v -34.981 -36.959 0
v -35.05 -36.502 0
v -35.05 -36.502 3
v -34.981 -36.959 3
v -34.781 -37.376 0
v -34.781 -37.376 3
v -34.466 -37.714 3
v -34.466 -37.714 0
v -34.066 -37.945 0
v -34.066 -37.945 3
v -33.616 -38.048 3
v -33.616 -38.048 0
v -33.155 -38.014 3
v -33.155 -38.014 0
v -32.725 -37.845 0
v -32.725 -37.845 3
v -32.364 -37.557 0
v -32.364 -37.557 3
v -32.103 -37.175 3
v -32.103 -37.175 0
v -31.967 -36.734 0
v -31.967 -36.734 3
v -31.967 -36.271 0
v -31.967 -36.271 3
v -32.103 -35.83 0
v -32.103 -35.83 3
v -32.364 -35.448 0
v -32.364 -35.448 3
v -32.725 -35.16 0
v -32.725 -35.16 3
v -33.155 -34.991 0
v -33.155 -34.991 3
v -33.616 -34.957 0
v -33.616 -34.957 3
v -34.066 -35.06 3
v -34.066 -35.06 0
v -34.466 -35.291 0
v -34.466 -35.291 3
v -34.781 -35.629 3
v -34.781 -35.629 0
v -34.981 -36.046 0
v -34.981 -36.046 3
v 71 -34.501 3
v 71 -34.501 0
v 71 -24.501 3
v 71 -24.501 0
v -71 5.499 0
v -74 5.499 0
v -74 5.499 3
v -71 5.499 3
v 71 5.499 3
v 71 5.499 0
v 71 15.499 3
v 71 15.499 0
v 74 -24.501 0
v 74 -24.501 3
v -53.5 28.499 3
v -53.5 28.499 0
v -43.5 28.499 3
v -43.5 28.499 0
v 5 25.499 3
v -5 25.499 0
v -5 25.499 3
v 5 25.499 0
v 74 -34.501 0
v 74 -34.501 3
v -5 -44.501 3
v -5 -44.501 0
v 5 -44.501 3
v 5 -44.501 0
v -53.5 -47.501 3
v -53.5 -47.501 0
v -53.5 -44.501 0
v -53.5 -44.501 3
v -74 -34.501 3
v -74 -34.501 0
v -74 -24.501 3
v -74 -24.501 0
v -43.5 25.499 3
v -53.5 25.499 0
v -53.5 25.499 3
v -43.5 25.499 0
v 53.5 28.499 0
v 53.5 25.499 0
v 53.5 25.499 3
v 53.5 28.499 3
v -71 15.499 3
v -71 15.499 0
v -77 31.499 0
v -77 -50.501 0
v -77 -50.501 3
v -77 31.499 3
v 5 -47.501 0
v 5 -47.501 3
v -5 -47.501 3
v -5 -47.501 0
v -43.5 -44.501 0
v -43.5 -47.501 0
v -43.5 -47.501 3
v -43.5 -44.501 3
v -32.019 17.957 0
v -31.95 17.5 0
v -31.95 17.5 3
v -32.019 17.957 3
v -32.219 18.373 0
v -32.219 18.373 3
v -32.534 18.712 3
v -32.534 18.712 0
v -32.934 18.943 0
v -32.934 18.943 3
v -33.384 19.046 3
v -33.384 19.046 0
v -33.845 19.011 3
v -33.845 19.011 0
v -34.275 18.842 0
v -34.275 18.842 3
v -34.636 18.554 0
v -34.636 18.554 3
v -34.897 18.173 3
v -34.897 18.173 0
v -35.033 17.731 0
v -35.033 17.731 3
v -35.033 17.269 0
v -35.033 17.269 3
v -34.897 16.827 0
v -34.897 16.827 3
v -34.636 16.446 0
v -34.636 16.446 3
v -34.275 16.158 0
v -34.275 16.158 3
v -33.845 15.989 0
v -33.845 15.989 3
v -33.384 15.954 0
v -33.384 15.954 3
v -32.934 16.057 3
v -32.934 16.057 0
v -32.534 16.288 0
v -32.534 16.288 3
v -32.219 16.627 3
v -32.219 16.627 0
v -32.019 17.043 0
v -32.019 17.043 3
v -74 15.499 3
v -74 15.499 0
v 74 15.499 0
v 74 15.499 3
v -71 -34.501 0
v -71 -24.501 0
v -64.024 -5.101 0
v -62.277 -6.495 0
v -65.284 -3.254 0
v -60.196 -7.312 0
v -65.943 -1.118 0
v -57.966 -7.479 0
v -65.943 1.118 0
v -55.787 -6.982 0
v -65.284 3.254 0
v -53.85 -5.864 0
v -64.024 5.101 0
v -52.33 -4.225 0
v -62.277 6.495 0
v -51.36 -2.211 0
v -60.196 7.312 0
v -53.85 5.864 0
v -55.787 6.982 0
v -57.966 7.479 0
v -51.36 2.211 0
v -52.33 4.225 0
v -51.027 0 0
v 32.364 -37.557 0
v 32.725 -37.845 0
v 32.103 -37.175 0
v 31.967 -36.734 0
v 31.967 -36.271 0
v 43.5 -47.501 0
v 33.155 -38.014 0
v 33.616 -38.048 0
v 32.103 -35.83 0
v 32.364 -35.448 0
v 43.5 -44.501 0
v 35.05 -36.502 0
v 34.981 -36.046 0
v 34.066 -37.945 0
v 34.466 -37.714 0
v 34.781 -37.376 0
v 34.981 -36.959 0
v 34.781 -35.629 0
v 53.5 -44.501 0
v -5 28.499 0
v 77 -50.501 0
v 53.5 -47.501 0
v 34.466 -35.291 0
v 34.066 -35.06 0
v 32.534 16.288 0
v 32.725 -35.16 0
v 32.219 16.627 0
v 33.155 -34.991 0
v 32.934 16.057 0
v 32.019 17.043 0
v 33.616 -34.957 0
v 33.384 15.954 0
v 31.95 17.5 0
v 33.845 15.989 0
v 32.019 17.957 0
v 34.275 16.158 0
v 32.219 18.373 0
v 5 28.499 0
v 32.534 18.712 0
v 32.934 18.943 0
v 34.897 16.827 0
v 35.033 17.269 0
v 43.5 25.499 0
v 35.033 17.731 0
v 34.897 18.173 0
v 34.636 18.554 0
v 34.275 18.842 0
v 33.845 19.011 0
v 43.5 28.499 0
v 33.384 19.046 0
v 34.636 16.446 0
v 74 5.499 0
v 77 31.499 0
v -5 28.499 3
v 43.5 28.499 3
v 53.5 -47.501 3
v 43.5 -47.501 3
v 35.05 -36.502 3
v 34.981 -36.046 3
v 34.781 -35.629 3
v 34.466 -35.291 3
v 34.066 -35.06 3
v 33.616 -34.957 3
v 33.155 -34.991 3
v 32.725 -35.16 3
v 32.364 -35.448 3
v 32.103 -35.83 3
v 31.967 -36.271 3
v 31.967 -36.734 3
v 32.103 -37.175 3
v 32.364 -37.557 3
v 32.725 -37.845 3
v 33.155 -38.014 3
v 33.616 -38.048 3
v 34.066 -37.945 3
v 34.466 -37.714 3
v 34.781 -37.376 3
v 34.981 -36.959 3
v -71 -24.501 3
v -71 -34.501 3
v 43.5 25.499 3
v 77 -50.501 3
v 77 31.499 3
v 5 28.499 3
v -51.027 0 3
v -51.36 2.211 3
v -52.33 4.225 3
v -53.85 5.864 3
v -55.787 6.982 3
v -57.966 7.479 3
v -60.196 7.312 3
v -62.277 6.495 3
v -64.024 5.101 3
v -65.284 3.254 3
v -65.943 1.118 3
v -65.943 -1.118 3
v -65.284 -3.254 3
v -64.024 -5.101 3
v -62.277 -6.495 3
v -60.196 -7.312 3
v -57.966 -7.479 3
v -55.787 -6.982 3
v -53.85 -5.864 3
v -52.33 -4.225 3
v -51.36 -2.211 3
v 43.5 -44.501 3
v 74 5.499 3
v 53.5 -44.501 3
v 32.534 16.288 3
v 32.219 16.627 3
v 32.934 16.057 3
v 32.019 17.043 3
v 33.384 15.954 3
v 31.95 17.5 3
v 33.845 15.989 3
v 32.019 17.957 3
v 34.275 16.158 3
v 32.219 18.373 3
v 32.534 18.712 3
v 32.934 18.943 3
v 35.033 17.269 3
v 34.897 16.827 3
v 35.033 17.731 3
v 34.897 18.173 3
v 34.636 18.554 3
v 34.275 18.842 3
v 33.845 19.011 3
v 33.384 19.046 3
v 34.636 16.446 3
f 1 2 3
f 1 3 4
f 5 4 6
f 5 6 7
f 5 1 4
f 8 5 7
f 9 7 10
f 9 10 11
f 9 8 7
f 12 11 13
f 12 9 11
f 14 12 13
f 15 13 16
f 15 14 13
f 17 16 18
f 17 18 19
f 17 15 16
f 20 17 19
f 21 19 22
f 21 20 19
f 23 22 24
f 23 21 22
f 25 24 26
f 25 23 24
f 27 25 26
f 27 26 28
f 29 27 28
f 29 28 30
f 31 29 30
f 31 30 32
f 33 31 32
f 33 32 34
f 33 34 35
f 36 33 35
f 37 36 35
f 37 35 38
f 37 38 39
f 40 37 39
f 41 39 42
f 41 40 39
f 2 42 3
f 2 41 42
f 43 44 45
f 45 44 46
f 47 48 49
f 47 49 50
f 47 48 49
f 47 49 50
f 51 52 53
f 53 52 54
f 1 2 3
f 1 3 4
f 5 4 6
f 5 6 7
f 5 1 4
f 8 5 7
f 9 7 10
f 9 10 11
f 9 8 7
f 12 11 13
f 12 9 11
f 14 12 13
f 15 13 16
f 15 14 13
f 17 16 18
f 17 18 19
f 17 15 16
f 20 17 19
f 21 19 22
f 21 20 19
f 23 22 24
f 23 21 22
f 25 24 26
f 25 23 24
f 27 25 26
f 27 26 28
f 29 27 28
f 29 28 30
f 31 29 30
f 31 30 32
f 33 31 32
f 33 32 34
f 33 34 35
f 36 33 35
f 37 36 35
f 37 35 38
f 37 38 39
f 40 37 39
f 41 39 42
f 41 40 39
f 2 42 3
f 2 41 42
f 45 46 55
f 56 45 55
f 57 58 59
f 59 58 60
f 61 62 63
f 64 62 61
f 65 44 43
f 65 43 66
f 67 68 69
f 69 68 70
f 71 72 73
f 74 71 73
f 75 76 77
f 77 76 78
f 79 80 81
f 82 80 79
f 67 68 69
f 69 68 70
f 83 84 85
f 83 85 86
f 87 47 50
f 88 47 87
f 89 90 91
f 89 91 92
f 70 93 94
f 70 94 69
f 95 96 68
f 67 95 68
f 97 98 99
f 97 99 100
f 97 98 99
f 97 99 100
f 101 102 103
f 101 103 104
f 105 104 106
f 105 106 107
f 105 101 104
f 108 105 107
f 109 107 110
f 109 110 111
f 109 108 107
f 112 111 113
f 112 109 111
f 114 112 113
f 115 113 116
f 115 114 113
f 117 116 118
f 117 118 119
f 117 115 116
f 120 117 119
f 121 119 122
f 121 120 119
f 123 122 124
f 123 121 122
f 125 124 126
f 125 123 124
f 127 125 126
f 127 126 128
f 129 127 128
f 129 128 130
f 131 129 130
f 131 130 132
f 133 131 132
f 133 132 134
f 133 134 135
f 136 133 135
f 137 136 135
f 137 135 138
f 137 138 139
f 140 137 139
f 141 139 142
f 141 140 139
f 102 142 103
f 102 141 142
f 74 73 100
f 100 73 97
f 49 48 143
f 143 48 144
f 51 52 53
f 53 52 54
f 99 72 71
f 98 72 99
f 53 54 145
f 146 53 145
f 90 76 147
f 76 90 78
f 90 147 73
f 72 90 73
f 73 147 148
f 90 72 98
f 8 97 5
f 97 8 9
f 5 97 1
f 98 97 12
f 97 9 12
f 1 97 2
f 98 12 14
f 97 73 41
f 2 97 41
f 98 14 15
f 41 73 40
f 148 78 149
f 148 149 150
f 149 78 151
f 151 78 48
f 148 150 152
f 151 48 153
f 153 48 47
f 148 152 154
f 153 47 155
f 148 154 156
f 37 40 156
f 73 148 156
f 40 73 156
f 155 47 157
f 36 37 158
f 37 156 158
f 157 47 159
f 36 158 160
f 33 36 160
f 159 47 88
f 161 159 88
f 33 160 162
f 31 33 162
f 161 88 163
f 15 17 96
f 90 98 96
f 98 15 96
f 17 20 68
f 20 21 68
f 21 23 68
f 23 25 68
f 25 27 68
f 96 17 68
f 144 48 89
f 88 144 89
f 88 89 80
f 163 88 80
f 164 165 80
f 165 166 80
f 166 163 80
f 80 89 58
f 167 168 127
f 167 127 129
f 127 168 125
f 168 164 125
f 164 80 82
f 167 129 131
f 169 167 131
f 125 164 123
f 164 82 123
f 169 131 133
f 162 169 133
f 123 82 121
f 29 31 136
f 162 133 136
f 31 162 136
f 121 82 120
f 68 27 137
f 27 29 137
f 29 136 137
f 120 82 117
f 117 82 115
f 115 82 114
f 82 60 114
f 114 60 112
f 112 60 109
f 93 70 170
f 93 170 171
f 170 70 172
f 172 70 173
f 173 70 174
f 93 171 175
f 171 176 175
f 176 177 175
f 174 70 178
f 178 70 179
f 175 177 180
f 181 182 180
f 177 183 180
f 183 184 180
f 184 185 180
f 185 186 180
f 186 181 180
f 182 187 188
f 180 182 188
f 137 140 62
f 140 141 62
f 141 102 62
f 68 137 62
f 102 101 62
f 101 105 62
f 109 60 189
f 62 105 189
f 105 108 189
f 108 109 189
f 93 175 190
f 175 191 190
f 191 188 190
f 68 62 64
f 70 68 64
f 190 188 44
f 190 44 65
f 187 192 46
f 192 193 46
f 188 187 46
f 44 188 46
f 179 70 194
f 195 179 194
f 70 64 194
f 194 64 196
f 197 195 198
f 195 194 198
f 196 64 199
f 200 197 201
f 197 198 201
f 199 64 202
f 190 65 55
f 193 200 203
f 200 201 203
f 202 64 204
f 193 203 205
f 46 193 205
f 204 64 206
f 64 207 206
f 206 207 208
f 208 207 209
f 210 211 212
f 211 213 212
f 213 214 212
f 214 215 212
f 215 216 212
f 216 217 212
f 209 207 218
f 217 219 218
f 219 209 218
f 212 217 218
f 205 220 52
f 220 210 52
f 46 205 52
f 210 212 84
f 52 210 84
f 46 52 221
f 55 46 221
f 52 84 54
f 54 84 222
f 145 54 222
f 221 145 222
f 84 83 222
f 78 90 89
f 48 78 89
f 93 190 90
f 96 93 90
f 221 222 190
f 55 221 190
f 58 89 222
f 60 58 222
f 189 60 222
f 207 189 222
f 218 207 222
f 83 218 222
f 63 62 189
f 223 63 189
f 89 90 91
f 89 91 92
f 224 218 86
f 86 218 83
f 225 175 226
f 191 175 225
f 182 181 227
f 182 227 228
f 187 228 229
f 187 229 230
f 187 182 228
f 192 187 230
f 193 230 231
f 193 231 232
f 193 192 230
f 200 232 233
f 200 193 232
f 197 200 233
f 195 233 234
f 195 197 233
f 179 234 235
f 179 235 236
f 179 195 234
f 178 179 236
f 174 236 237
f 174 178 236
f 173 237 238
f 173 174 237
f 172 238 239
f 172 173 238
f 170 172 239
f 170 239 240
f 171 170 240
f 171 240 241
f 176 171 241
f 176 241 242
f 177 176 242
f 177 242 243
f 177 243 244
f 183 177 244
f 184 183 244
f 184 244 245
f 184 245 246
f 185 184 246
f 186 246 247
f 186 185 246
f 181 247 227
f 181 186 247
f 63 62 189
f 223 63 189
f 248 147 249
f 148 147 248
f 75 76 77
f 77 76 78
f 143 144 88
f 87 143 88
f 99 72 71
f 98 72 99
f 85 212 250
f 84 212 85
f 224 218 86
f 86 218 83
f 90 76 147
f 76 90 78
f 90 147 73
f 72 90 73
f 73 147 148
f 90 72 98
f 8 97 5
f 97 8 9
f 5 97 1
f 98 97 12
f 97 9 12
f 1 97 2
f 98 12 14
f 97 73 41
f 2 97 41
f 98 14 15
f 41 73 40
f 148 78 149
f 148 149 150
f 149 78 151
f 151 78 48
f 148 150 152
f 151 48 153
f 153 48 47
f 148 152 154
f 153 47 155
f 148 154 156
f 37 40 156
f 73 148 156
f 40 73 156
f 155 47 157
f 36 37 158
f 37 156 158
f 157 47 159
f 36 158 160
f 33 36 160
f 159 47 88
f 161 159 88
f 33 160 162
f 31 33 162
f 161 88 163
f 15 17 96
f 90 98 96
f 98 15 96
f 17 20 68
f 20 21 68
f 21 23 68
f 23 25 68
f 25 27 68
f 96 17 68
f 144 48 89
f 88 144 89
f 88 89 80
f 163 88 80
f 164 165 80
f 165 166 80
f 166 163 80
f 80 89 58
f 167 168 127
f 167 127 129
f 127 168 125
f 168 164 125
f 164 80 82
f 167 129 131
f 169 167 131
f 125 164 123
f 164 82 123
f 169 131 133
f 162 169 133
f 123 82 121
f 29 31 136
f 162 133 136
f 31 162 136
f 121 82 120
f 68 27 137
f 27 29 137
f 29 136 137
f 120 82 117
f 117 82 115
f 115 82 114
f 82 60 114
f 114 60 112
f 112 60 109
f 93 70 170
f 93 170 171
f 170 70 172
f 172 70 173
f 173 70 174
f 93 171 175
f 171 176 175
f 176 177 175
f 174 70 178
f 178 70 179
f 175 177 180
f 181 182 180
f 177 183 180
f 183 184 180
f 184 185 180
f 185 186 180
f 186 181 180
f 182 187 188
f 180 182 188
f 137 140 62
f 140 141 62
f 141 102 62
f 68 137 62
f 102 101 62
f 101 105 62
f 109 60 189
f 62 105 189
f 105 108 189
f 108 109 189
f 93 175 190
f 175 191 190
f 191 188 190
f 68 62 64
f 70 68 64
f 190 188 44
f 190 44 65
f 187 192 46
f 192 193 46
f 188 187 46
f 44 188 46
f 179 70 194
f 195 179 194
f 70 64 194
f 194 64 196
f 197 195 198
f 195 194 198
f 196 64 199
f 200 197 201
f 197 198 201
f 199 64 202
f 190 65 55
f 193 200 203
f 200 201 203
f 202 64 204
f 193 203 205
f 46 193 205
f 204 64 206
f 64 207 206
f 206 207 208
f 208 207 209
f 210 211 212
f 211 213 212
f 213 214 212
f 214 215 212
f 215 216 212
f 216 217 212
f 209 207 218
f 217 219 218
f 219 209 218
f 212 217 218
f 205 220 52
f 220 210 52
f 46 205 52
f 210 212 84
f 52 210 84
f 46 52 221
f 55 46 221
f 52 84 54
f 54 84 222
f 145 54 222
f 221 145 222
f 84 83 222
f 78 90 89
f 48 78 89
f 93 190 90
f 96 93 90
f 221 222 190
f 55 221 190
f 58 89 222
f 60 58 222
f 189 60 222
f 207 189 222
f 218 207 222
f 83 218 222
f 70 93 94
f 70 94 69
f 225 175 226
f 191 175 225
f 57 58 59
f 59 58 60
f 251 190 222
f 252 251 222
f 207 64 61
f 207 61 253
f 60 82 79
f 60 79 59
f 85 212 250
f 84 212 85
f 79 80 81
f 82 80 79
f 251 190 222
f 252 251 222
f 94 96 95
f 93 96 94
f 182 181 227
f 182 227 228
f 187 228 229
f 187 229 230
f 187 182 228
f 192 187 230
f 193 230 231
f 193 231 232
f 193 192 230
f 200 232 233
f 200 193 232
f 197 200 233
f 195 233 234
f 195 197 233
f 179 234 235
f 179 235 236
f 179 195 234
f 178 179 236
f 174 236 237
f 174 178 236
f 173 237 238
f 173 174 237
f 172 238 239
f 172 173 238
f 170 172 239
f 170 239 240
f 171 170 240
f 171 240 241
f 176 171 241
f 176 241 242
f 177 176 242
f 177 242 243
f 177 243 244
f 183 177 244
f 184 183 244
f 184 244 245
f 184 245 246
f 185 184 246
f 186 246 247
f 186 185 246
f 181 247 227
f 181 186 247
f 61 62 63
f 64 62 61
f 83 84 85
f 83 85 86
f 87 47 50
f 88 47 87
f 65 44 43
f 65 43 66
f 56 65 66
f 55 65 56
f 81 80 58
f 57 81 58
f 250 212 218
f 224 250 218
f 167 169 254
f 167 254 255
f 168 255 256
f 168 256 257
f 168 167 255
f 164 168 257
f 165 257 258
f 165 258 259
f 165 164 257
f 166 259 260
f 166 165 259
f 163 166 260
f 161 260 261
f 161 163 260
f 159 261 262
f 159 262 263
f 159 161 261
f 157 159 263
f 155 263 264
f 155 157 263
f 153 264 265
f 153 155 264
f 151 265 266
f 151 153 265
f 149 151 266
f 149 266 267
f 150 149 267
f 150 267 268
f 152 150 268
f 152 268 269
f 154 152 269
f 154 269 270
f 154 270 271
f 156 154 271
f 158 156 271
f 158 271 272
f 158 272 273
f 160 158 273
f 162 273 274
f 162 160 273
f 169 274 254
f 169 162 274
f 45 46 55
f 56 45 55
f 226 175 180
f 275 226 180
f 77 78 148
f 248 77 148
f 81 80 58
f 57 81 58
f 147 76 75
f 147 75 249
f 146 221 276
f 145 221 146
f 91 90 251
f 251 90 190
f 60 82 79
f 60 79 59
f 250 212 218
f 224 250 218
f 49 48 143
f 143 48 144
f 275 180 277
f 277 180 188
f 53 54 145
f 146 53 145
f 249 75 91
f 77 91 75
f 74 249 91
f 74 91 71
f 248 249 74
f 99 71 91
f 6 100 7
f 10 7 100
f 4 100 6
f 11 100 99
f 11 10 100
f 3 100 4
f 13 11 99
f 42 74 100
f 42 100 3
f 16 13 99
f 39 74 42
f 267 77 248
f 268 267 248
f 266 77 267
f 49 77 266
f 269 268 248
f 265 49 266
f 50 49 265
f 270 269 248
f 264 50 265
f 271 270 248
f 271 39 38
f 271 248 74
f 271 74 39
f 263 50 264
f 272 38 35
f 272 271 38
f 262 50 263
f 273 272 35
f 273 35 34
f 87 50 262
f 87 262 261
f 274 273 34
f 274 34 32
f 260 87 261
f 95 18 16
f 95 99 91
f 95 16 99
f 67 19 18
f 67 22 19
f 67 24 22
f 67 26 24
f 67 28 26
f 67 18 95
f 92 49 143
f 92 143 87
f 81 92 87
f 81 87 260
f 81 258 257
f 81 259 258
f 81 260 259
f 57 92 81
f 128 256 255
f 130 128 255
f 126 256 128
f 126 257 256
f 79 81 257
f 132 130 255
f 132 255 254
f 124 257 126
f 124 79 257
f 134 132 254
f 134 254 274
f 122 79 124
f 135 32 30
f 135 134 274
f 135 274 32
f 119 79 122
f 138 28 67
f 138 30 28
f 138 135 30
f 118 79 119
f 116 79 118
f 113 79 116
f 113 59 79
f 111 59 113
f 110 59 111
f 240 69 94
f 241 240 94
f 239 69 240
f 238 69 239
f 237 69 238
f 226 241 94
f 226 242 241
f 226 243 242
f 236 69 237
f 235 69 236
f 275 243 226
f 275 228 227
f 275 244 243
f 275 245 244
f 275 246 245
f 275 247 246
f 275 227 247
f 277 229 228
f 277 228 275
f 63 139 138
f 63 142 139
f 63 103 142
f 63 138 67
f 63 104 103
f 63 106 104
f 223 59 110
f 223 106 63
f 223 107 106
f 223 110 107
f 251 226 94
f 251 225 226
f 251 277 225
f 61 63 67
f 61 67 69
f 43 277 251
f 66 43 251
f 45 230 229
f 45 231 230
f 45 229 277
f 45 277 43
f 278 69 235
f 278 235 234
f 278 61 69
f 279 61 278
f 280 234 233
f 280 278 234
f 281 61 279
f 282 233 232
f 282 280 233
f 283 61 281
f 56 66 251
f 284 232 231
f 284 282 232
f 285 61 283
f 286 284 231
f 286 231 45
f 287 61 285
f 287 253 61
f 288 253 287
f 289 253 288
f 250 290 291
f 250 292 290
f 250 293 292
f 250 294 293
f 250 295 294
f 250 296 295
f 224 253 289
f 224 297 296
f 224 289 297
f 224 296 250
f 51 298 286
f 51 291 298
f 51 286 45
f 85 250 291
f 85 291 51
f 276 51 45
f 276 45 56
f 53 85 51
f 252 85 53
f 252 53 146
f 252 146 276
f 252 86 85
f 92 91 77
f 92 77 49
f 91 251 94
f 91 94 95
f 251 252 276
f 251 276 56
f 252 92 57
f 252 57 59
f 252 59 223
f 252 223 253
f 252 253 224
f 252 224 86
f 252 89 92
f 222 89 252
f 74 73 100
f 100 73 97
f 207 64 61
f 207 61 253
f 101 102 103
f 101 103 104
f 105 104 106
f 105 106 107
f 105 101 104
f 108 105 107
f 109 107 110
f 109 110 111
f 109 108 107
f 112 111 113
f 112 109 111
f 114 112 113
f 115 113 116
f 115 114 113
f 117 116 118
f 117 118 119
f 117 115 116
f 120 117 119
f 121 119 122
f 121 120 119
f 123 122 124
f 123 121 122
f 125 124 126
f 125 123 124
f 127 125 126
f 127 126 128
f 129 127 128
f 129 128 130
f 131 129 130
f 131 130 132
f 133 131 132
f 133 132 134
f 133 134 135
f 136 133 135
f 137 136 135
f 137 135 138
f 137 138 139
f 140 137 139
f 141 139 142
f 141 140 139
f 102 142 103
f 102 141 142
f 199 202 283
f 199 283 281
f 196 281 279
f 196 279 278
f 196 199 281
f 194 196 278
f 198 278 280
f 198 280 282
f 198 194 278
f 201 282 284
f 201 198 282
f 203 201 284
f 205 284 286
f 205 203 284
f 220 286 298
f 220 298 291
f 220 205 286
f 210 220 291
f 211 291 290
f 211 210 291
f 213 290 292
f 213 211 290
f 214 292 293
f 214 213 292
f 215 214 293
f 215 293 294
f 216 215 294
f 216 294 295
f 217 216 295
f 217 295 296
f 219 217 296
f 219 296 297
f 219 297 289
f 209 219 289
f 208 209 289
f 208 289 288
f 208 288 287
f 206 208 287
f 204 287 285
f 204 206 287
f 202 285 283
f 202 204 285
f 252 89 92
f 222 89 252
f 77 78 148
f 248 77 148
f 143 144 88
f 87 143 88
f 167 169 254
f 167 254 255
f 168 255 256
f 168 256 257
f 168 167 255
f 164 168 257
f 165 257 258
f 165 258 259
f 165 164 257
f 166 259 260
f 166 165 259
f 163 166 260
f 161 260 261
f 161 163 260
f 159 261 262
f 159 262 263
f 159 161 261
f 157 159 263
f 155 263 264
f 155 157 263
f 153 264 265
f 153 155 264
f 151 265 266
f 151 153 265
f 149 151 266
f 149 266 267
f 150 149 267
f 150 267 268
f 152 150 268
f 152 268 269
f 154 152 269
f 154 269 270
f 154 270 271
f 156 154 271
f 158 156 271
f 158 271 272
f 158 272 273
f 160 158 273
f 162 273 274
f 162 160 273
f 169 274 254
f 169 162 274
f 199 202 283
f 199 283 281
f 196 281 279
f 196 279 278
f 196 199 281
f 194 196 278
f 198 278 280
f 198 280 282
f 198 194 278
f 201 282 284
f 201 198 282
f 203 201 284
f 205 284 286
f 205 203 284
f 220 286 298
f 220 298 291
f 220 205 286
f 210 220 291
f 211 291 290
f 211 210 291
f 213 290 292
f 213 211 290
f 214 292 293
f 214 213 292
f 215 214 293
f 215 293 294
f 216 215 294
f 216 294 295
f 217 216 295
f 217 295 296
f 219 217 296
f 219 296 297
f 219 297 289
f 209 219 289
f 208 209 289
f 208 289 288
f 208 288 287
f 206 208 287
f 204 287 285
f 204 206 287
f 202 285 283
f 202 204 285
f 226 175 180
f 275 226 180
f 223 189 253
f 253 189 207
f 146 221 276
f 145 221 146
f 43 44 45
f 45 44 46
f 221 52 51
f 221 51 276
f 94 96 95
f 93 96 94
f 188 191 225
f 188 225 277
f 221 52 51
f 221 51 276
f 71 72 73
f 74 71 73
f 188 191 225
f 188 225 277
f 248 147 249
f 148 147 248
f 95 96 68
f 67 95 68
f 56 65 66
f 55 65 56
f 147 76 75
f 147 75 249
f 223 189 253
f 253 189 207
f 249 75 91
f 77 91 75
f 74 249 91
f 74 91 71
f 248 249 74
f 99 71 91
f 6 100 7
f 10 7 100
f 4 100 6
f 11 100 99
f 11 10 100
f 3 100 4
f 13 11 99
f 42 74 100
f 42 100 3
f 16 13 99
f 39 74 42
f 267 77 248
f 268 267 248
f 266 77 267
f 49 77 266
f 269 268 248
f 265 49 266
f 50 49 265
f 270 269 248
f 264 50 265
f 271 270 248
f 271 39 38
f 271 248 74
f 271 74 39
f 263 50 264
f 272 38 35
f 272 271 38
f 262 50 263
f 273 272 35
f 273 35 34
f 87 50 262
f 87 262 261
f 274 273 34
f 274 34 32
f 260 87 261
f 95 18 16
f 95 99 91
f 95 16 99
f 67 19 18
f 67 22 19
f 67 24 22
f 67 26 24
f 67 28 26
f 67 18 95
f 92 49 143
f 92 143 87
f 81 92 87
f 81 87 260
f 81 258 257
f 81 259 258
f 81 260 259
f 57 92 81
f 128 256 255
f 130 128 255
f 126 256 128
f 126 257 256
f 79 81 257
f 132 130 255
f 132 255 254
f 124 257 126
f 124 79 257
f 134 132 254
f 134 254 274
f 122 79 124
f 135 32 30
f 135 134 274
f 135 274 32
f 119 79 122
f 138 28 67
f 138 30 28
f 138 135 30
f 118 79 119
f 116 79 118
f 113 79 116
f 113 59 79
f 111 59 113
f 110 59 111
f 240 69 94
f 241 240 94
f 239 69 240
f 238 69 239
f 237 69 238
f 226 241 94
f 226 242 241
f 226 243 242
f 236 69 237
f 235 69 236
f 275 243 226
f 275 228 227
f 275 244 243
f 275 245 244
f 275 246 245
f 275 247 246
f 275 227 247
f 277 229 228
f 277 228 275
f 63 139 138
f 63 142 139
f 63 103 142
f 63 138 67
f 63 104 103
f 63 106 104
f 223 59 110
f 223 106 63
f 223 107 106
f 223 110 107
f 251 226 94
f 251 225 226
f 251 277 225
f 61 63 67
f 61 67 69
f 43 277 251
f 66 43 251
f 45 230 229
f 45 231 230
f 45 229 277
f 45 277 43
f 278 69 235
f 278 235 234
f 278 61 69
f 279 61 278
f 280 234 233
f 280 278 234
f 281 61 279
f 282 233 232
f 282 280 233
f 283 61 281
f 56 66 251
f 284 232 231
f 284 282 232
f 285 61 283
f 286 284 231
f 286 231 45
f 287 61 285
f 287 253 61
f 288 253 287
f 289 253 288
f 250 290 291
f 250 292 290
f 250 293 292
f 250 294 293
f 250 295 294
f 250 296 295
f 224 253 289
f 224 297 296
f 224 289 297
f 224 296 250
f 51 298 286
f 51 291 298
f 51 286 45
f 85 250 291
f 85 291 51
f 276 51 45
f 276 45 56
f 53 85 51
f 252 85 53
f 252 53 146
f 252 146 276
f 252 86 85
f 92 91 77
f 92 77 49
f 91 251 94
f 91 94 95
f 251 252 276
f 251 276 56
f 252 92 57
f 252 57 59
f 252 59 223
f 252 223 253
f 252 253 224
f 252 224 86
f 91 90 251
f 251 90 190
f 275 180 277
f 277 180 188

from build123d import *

# Parameters (mm, degrees)
SKETCH_1_2_W    = 154
SKETCH_1_2_H    = 82
SKETCH_1_2_R    = 1.55
SKETCH_1_2_R_2  = 7.5
SKETCH_1_2_W_2  = 3
SKETCH_1_2_H_2  = 10
SKETCH_1_2_W_3  = 10
SKETCH_1_2_H_3  = 3
EXTRUDE_2_DEPTH = 3
SKETCH_1_W      = 154
SKETCH_1_H      = 82
SKETCH_1_R      = 1.55
SKETCH_1_R_2    = 7.5
SKETCH_1_W_2    = 3
SKETCH_1_H_2    = 10
SKETCH_1_W_3    = 10
SKETCH_1_H_3    = 3
EXTRUDE_1_DEPTH = 3


with BuildPart() as part:
    # 草图1<2> → 凸台-拉伸2 (new body)
    with BuildSketch(Plane.XY):
        with Locations((0, -9.501246883)):
            Rectangle(SKETCH_1_2_W, SKETCH_1_2_H)
        with Locations((-33.5, 17.5)):
            Circle(SKETCH_1_2_R, mode=Mode.SUBTRACT)
        with Locations((-33.5, -36.502493766)):
            Circle(SKETCH_1_2_R, mode=Mode.SUBTRACT)
        with Locations((33.5, -36.502493766)):
            Circle(SKETCH_1_2_R, mode=Mode.SUBTRACT)
        with Locations((33.5, 17.5)):
            Circle(SKETCH_1_2_R, mode=Mode.SUBTRACT)
        with Locations((-58.526601202, 0)):
            Circle(SKETCH_1_2_R_2, mode=Mode.SUBTRACT)
        with Locations((-72.5, -29.501246883)):
            Rectangle(SKETCH_1_2_W_2, SKETCH_1_2_H_2, mode=Mode.SUBTRACT)
        with Locations((-48.5, -46.001246883)):
            Rectangle(SKETCH_1_2_W_3, SKETCH_1_2_H_3, mode=Mode.SUBTRACT)
        with Locations((0, -46.001246883)):
            Rectangle(SKETCH_1_2_W_3, SKETCH_1_2_H_3, mode=Mode.SUBTRACT)
        with Locations((0, 26.998753117)):
            Rectangle(SKETCH_1_2_W_3, SKETCH_1_2_H_3, mode=Mode.SUBTRACT)
        with Locations((-48.5, 26.998753117)):
            Rectangle(SKETCH_1_2_W_3, SKETCH_1_2_H_3, mode=Mode.SUBTRACT)
        with Locations((-72.5, 10.498753117)):
            Rectangle(SKETCH_1_2_W_2, SKETCH_1_2_H_2, mode=Mode.SUBTRACT)
        with Locations((48.5, -46.001246883)):
            Rectangle(SKETCH_1_2_W_3, SKETCH_1_2_H_3, mode=Mode.SUBTRACT)
        with Locations((72.5, -29.501246883)):
            Rectangle(SKETCH_1_2_W_2, SKETCH_1_2_H_2, mode=Mode.SUBTRACT)
        with Locations((72.5, 10.498753117)):
            Rectangle(SKETCH_1_2_W_2, SKETCH_1_2_H_2, mode=Mode.SUBTRACT)
        with Locations((48.5, 26.998753117)):
            Rectangle(SKETCH_1_2_W_3, SKETCH_1_2_H_3, mode=Mode.SUBTRACT)
    extrude(amount=EXTRUDE_2_DEPTH)


with BuildPart() as body_2:
    # 草图1 → 凸台-拉伸1 (new body)
    with BuildSketch(Plane.XY):
        with Locations((0, -9.501246883)):
            Rectangle(SKETCH_1_W, SKETCH_1_H)
        with Locations((-33.5, 17.5)):
            Circle(SKETCH_1_R, mode=Mode.SUBTRACT)
        with Locations((-33.5, -36.502493766)):
            Circle(SKETCH_1_R, mode=Mode.SUBTRACT)
        with Locations((33.5, -36.502493766)):
            Circle(SKETCH_1_R, mode=Mode.SUBTRACT)
        with Locations((33.5, 17.5)):
            Circle(SKETCH_1_R, mode=Mode.SUBTRACT)
        with Locations((-58.526601202, 0)):
            Circle(SKETCH_1_R_2, mode=Mode.SUBTRACT)
        with Locations((-72.5, -29.501246883)):
            Rectangle(SKETCH_1_W_2, SKETCH_1_H_2, mode=Mode.SUBTRACT)
        with Locations((-48.5, -46.001246883)):
            Rectangle(SKETCH_1_W_3, SKETCH_1_H_3, mode=Mode.SUBTRACT)
        with Locations((0, -46.001246883)):
            Rectangle(SKETCH_1_W_3, SKETCH_1_H_3, mode=Mode.SUBTRACT)
        with Locations((0, 26.998753117)):
            Rectangle(SKETCH_1_W_3, SKETCH_1_H_3, mode=Mode.SUBTRACT)
        with Locations((-48.5, 26.998753117)):
            Rectangle(SKETCH_1_W_3, SKETCH_1_H_3, mode=Mode.SUBTRACT)
        with Locations((-72.5, 10.498753117)):
            Rectangle(SKETCH_1_W_2, SKETCH_1_H_2, mode=Mode.SUBTRACT)
        with Locations((48.5, -46.001246883)):
            Rectangle(SKETCH_1_W_3, SKETCH_1_H_3, mode=Mode.SUBTRACT)
        with Locations((72.5, -29.501246883)):
            Rectangle(SKETCH_1_W_2, SKETCH_1_H_2, mode=Mode.SUBTRACT)
        with Locations((72.5, 10.498753117)):
            Rectangle(SKETCH_1_W_2, SKETCH_1_H_2, mode=Mode.SUBTRACT)
        with Locations((48.5, 26.998753117)):
            Rectangle(SKETCH_1_W_3, SKETCH_1_H_3, mode=Mode.SUBTRACT)
    extrude(amount=EXTRUDE_1_DEPTH)


solid = Compound([part.part, body_2.part])
